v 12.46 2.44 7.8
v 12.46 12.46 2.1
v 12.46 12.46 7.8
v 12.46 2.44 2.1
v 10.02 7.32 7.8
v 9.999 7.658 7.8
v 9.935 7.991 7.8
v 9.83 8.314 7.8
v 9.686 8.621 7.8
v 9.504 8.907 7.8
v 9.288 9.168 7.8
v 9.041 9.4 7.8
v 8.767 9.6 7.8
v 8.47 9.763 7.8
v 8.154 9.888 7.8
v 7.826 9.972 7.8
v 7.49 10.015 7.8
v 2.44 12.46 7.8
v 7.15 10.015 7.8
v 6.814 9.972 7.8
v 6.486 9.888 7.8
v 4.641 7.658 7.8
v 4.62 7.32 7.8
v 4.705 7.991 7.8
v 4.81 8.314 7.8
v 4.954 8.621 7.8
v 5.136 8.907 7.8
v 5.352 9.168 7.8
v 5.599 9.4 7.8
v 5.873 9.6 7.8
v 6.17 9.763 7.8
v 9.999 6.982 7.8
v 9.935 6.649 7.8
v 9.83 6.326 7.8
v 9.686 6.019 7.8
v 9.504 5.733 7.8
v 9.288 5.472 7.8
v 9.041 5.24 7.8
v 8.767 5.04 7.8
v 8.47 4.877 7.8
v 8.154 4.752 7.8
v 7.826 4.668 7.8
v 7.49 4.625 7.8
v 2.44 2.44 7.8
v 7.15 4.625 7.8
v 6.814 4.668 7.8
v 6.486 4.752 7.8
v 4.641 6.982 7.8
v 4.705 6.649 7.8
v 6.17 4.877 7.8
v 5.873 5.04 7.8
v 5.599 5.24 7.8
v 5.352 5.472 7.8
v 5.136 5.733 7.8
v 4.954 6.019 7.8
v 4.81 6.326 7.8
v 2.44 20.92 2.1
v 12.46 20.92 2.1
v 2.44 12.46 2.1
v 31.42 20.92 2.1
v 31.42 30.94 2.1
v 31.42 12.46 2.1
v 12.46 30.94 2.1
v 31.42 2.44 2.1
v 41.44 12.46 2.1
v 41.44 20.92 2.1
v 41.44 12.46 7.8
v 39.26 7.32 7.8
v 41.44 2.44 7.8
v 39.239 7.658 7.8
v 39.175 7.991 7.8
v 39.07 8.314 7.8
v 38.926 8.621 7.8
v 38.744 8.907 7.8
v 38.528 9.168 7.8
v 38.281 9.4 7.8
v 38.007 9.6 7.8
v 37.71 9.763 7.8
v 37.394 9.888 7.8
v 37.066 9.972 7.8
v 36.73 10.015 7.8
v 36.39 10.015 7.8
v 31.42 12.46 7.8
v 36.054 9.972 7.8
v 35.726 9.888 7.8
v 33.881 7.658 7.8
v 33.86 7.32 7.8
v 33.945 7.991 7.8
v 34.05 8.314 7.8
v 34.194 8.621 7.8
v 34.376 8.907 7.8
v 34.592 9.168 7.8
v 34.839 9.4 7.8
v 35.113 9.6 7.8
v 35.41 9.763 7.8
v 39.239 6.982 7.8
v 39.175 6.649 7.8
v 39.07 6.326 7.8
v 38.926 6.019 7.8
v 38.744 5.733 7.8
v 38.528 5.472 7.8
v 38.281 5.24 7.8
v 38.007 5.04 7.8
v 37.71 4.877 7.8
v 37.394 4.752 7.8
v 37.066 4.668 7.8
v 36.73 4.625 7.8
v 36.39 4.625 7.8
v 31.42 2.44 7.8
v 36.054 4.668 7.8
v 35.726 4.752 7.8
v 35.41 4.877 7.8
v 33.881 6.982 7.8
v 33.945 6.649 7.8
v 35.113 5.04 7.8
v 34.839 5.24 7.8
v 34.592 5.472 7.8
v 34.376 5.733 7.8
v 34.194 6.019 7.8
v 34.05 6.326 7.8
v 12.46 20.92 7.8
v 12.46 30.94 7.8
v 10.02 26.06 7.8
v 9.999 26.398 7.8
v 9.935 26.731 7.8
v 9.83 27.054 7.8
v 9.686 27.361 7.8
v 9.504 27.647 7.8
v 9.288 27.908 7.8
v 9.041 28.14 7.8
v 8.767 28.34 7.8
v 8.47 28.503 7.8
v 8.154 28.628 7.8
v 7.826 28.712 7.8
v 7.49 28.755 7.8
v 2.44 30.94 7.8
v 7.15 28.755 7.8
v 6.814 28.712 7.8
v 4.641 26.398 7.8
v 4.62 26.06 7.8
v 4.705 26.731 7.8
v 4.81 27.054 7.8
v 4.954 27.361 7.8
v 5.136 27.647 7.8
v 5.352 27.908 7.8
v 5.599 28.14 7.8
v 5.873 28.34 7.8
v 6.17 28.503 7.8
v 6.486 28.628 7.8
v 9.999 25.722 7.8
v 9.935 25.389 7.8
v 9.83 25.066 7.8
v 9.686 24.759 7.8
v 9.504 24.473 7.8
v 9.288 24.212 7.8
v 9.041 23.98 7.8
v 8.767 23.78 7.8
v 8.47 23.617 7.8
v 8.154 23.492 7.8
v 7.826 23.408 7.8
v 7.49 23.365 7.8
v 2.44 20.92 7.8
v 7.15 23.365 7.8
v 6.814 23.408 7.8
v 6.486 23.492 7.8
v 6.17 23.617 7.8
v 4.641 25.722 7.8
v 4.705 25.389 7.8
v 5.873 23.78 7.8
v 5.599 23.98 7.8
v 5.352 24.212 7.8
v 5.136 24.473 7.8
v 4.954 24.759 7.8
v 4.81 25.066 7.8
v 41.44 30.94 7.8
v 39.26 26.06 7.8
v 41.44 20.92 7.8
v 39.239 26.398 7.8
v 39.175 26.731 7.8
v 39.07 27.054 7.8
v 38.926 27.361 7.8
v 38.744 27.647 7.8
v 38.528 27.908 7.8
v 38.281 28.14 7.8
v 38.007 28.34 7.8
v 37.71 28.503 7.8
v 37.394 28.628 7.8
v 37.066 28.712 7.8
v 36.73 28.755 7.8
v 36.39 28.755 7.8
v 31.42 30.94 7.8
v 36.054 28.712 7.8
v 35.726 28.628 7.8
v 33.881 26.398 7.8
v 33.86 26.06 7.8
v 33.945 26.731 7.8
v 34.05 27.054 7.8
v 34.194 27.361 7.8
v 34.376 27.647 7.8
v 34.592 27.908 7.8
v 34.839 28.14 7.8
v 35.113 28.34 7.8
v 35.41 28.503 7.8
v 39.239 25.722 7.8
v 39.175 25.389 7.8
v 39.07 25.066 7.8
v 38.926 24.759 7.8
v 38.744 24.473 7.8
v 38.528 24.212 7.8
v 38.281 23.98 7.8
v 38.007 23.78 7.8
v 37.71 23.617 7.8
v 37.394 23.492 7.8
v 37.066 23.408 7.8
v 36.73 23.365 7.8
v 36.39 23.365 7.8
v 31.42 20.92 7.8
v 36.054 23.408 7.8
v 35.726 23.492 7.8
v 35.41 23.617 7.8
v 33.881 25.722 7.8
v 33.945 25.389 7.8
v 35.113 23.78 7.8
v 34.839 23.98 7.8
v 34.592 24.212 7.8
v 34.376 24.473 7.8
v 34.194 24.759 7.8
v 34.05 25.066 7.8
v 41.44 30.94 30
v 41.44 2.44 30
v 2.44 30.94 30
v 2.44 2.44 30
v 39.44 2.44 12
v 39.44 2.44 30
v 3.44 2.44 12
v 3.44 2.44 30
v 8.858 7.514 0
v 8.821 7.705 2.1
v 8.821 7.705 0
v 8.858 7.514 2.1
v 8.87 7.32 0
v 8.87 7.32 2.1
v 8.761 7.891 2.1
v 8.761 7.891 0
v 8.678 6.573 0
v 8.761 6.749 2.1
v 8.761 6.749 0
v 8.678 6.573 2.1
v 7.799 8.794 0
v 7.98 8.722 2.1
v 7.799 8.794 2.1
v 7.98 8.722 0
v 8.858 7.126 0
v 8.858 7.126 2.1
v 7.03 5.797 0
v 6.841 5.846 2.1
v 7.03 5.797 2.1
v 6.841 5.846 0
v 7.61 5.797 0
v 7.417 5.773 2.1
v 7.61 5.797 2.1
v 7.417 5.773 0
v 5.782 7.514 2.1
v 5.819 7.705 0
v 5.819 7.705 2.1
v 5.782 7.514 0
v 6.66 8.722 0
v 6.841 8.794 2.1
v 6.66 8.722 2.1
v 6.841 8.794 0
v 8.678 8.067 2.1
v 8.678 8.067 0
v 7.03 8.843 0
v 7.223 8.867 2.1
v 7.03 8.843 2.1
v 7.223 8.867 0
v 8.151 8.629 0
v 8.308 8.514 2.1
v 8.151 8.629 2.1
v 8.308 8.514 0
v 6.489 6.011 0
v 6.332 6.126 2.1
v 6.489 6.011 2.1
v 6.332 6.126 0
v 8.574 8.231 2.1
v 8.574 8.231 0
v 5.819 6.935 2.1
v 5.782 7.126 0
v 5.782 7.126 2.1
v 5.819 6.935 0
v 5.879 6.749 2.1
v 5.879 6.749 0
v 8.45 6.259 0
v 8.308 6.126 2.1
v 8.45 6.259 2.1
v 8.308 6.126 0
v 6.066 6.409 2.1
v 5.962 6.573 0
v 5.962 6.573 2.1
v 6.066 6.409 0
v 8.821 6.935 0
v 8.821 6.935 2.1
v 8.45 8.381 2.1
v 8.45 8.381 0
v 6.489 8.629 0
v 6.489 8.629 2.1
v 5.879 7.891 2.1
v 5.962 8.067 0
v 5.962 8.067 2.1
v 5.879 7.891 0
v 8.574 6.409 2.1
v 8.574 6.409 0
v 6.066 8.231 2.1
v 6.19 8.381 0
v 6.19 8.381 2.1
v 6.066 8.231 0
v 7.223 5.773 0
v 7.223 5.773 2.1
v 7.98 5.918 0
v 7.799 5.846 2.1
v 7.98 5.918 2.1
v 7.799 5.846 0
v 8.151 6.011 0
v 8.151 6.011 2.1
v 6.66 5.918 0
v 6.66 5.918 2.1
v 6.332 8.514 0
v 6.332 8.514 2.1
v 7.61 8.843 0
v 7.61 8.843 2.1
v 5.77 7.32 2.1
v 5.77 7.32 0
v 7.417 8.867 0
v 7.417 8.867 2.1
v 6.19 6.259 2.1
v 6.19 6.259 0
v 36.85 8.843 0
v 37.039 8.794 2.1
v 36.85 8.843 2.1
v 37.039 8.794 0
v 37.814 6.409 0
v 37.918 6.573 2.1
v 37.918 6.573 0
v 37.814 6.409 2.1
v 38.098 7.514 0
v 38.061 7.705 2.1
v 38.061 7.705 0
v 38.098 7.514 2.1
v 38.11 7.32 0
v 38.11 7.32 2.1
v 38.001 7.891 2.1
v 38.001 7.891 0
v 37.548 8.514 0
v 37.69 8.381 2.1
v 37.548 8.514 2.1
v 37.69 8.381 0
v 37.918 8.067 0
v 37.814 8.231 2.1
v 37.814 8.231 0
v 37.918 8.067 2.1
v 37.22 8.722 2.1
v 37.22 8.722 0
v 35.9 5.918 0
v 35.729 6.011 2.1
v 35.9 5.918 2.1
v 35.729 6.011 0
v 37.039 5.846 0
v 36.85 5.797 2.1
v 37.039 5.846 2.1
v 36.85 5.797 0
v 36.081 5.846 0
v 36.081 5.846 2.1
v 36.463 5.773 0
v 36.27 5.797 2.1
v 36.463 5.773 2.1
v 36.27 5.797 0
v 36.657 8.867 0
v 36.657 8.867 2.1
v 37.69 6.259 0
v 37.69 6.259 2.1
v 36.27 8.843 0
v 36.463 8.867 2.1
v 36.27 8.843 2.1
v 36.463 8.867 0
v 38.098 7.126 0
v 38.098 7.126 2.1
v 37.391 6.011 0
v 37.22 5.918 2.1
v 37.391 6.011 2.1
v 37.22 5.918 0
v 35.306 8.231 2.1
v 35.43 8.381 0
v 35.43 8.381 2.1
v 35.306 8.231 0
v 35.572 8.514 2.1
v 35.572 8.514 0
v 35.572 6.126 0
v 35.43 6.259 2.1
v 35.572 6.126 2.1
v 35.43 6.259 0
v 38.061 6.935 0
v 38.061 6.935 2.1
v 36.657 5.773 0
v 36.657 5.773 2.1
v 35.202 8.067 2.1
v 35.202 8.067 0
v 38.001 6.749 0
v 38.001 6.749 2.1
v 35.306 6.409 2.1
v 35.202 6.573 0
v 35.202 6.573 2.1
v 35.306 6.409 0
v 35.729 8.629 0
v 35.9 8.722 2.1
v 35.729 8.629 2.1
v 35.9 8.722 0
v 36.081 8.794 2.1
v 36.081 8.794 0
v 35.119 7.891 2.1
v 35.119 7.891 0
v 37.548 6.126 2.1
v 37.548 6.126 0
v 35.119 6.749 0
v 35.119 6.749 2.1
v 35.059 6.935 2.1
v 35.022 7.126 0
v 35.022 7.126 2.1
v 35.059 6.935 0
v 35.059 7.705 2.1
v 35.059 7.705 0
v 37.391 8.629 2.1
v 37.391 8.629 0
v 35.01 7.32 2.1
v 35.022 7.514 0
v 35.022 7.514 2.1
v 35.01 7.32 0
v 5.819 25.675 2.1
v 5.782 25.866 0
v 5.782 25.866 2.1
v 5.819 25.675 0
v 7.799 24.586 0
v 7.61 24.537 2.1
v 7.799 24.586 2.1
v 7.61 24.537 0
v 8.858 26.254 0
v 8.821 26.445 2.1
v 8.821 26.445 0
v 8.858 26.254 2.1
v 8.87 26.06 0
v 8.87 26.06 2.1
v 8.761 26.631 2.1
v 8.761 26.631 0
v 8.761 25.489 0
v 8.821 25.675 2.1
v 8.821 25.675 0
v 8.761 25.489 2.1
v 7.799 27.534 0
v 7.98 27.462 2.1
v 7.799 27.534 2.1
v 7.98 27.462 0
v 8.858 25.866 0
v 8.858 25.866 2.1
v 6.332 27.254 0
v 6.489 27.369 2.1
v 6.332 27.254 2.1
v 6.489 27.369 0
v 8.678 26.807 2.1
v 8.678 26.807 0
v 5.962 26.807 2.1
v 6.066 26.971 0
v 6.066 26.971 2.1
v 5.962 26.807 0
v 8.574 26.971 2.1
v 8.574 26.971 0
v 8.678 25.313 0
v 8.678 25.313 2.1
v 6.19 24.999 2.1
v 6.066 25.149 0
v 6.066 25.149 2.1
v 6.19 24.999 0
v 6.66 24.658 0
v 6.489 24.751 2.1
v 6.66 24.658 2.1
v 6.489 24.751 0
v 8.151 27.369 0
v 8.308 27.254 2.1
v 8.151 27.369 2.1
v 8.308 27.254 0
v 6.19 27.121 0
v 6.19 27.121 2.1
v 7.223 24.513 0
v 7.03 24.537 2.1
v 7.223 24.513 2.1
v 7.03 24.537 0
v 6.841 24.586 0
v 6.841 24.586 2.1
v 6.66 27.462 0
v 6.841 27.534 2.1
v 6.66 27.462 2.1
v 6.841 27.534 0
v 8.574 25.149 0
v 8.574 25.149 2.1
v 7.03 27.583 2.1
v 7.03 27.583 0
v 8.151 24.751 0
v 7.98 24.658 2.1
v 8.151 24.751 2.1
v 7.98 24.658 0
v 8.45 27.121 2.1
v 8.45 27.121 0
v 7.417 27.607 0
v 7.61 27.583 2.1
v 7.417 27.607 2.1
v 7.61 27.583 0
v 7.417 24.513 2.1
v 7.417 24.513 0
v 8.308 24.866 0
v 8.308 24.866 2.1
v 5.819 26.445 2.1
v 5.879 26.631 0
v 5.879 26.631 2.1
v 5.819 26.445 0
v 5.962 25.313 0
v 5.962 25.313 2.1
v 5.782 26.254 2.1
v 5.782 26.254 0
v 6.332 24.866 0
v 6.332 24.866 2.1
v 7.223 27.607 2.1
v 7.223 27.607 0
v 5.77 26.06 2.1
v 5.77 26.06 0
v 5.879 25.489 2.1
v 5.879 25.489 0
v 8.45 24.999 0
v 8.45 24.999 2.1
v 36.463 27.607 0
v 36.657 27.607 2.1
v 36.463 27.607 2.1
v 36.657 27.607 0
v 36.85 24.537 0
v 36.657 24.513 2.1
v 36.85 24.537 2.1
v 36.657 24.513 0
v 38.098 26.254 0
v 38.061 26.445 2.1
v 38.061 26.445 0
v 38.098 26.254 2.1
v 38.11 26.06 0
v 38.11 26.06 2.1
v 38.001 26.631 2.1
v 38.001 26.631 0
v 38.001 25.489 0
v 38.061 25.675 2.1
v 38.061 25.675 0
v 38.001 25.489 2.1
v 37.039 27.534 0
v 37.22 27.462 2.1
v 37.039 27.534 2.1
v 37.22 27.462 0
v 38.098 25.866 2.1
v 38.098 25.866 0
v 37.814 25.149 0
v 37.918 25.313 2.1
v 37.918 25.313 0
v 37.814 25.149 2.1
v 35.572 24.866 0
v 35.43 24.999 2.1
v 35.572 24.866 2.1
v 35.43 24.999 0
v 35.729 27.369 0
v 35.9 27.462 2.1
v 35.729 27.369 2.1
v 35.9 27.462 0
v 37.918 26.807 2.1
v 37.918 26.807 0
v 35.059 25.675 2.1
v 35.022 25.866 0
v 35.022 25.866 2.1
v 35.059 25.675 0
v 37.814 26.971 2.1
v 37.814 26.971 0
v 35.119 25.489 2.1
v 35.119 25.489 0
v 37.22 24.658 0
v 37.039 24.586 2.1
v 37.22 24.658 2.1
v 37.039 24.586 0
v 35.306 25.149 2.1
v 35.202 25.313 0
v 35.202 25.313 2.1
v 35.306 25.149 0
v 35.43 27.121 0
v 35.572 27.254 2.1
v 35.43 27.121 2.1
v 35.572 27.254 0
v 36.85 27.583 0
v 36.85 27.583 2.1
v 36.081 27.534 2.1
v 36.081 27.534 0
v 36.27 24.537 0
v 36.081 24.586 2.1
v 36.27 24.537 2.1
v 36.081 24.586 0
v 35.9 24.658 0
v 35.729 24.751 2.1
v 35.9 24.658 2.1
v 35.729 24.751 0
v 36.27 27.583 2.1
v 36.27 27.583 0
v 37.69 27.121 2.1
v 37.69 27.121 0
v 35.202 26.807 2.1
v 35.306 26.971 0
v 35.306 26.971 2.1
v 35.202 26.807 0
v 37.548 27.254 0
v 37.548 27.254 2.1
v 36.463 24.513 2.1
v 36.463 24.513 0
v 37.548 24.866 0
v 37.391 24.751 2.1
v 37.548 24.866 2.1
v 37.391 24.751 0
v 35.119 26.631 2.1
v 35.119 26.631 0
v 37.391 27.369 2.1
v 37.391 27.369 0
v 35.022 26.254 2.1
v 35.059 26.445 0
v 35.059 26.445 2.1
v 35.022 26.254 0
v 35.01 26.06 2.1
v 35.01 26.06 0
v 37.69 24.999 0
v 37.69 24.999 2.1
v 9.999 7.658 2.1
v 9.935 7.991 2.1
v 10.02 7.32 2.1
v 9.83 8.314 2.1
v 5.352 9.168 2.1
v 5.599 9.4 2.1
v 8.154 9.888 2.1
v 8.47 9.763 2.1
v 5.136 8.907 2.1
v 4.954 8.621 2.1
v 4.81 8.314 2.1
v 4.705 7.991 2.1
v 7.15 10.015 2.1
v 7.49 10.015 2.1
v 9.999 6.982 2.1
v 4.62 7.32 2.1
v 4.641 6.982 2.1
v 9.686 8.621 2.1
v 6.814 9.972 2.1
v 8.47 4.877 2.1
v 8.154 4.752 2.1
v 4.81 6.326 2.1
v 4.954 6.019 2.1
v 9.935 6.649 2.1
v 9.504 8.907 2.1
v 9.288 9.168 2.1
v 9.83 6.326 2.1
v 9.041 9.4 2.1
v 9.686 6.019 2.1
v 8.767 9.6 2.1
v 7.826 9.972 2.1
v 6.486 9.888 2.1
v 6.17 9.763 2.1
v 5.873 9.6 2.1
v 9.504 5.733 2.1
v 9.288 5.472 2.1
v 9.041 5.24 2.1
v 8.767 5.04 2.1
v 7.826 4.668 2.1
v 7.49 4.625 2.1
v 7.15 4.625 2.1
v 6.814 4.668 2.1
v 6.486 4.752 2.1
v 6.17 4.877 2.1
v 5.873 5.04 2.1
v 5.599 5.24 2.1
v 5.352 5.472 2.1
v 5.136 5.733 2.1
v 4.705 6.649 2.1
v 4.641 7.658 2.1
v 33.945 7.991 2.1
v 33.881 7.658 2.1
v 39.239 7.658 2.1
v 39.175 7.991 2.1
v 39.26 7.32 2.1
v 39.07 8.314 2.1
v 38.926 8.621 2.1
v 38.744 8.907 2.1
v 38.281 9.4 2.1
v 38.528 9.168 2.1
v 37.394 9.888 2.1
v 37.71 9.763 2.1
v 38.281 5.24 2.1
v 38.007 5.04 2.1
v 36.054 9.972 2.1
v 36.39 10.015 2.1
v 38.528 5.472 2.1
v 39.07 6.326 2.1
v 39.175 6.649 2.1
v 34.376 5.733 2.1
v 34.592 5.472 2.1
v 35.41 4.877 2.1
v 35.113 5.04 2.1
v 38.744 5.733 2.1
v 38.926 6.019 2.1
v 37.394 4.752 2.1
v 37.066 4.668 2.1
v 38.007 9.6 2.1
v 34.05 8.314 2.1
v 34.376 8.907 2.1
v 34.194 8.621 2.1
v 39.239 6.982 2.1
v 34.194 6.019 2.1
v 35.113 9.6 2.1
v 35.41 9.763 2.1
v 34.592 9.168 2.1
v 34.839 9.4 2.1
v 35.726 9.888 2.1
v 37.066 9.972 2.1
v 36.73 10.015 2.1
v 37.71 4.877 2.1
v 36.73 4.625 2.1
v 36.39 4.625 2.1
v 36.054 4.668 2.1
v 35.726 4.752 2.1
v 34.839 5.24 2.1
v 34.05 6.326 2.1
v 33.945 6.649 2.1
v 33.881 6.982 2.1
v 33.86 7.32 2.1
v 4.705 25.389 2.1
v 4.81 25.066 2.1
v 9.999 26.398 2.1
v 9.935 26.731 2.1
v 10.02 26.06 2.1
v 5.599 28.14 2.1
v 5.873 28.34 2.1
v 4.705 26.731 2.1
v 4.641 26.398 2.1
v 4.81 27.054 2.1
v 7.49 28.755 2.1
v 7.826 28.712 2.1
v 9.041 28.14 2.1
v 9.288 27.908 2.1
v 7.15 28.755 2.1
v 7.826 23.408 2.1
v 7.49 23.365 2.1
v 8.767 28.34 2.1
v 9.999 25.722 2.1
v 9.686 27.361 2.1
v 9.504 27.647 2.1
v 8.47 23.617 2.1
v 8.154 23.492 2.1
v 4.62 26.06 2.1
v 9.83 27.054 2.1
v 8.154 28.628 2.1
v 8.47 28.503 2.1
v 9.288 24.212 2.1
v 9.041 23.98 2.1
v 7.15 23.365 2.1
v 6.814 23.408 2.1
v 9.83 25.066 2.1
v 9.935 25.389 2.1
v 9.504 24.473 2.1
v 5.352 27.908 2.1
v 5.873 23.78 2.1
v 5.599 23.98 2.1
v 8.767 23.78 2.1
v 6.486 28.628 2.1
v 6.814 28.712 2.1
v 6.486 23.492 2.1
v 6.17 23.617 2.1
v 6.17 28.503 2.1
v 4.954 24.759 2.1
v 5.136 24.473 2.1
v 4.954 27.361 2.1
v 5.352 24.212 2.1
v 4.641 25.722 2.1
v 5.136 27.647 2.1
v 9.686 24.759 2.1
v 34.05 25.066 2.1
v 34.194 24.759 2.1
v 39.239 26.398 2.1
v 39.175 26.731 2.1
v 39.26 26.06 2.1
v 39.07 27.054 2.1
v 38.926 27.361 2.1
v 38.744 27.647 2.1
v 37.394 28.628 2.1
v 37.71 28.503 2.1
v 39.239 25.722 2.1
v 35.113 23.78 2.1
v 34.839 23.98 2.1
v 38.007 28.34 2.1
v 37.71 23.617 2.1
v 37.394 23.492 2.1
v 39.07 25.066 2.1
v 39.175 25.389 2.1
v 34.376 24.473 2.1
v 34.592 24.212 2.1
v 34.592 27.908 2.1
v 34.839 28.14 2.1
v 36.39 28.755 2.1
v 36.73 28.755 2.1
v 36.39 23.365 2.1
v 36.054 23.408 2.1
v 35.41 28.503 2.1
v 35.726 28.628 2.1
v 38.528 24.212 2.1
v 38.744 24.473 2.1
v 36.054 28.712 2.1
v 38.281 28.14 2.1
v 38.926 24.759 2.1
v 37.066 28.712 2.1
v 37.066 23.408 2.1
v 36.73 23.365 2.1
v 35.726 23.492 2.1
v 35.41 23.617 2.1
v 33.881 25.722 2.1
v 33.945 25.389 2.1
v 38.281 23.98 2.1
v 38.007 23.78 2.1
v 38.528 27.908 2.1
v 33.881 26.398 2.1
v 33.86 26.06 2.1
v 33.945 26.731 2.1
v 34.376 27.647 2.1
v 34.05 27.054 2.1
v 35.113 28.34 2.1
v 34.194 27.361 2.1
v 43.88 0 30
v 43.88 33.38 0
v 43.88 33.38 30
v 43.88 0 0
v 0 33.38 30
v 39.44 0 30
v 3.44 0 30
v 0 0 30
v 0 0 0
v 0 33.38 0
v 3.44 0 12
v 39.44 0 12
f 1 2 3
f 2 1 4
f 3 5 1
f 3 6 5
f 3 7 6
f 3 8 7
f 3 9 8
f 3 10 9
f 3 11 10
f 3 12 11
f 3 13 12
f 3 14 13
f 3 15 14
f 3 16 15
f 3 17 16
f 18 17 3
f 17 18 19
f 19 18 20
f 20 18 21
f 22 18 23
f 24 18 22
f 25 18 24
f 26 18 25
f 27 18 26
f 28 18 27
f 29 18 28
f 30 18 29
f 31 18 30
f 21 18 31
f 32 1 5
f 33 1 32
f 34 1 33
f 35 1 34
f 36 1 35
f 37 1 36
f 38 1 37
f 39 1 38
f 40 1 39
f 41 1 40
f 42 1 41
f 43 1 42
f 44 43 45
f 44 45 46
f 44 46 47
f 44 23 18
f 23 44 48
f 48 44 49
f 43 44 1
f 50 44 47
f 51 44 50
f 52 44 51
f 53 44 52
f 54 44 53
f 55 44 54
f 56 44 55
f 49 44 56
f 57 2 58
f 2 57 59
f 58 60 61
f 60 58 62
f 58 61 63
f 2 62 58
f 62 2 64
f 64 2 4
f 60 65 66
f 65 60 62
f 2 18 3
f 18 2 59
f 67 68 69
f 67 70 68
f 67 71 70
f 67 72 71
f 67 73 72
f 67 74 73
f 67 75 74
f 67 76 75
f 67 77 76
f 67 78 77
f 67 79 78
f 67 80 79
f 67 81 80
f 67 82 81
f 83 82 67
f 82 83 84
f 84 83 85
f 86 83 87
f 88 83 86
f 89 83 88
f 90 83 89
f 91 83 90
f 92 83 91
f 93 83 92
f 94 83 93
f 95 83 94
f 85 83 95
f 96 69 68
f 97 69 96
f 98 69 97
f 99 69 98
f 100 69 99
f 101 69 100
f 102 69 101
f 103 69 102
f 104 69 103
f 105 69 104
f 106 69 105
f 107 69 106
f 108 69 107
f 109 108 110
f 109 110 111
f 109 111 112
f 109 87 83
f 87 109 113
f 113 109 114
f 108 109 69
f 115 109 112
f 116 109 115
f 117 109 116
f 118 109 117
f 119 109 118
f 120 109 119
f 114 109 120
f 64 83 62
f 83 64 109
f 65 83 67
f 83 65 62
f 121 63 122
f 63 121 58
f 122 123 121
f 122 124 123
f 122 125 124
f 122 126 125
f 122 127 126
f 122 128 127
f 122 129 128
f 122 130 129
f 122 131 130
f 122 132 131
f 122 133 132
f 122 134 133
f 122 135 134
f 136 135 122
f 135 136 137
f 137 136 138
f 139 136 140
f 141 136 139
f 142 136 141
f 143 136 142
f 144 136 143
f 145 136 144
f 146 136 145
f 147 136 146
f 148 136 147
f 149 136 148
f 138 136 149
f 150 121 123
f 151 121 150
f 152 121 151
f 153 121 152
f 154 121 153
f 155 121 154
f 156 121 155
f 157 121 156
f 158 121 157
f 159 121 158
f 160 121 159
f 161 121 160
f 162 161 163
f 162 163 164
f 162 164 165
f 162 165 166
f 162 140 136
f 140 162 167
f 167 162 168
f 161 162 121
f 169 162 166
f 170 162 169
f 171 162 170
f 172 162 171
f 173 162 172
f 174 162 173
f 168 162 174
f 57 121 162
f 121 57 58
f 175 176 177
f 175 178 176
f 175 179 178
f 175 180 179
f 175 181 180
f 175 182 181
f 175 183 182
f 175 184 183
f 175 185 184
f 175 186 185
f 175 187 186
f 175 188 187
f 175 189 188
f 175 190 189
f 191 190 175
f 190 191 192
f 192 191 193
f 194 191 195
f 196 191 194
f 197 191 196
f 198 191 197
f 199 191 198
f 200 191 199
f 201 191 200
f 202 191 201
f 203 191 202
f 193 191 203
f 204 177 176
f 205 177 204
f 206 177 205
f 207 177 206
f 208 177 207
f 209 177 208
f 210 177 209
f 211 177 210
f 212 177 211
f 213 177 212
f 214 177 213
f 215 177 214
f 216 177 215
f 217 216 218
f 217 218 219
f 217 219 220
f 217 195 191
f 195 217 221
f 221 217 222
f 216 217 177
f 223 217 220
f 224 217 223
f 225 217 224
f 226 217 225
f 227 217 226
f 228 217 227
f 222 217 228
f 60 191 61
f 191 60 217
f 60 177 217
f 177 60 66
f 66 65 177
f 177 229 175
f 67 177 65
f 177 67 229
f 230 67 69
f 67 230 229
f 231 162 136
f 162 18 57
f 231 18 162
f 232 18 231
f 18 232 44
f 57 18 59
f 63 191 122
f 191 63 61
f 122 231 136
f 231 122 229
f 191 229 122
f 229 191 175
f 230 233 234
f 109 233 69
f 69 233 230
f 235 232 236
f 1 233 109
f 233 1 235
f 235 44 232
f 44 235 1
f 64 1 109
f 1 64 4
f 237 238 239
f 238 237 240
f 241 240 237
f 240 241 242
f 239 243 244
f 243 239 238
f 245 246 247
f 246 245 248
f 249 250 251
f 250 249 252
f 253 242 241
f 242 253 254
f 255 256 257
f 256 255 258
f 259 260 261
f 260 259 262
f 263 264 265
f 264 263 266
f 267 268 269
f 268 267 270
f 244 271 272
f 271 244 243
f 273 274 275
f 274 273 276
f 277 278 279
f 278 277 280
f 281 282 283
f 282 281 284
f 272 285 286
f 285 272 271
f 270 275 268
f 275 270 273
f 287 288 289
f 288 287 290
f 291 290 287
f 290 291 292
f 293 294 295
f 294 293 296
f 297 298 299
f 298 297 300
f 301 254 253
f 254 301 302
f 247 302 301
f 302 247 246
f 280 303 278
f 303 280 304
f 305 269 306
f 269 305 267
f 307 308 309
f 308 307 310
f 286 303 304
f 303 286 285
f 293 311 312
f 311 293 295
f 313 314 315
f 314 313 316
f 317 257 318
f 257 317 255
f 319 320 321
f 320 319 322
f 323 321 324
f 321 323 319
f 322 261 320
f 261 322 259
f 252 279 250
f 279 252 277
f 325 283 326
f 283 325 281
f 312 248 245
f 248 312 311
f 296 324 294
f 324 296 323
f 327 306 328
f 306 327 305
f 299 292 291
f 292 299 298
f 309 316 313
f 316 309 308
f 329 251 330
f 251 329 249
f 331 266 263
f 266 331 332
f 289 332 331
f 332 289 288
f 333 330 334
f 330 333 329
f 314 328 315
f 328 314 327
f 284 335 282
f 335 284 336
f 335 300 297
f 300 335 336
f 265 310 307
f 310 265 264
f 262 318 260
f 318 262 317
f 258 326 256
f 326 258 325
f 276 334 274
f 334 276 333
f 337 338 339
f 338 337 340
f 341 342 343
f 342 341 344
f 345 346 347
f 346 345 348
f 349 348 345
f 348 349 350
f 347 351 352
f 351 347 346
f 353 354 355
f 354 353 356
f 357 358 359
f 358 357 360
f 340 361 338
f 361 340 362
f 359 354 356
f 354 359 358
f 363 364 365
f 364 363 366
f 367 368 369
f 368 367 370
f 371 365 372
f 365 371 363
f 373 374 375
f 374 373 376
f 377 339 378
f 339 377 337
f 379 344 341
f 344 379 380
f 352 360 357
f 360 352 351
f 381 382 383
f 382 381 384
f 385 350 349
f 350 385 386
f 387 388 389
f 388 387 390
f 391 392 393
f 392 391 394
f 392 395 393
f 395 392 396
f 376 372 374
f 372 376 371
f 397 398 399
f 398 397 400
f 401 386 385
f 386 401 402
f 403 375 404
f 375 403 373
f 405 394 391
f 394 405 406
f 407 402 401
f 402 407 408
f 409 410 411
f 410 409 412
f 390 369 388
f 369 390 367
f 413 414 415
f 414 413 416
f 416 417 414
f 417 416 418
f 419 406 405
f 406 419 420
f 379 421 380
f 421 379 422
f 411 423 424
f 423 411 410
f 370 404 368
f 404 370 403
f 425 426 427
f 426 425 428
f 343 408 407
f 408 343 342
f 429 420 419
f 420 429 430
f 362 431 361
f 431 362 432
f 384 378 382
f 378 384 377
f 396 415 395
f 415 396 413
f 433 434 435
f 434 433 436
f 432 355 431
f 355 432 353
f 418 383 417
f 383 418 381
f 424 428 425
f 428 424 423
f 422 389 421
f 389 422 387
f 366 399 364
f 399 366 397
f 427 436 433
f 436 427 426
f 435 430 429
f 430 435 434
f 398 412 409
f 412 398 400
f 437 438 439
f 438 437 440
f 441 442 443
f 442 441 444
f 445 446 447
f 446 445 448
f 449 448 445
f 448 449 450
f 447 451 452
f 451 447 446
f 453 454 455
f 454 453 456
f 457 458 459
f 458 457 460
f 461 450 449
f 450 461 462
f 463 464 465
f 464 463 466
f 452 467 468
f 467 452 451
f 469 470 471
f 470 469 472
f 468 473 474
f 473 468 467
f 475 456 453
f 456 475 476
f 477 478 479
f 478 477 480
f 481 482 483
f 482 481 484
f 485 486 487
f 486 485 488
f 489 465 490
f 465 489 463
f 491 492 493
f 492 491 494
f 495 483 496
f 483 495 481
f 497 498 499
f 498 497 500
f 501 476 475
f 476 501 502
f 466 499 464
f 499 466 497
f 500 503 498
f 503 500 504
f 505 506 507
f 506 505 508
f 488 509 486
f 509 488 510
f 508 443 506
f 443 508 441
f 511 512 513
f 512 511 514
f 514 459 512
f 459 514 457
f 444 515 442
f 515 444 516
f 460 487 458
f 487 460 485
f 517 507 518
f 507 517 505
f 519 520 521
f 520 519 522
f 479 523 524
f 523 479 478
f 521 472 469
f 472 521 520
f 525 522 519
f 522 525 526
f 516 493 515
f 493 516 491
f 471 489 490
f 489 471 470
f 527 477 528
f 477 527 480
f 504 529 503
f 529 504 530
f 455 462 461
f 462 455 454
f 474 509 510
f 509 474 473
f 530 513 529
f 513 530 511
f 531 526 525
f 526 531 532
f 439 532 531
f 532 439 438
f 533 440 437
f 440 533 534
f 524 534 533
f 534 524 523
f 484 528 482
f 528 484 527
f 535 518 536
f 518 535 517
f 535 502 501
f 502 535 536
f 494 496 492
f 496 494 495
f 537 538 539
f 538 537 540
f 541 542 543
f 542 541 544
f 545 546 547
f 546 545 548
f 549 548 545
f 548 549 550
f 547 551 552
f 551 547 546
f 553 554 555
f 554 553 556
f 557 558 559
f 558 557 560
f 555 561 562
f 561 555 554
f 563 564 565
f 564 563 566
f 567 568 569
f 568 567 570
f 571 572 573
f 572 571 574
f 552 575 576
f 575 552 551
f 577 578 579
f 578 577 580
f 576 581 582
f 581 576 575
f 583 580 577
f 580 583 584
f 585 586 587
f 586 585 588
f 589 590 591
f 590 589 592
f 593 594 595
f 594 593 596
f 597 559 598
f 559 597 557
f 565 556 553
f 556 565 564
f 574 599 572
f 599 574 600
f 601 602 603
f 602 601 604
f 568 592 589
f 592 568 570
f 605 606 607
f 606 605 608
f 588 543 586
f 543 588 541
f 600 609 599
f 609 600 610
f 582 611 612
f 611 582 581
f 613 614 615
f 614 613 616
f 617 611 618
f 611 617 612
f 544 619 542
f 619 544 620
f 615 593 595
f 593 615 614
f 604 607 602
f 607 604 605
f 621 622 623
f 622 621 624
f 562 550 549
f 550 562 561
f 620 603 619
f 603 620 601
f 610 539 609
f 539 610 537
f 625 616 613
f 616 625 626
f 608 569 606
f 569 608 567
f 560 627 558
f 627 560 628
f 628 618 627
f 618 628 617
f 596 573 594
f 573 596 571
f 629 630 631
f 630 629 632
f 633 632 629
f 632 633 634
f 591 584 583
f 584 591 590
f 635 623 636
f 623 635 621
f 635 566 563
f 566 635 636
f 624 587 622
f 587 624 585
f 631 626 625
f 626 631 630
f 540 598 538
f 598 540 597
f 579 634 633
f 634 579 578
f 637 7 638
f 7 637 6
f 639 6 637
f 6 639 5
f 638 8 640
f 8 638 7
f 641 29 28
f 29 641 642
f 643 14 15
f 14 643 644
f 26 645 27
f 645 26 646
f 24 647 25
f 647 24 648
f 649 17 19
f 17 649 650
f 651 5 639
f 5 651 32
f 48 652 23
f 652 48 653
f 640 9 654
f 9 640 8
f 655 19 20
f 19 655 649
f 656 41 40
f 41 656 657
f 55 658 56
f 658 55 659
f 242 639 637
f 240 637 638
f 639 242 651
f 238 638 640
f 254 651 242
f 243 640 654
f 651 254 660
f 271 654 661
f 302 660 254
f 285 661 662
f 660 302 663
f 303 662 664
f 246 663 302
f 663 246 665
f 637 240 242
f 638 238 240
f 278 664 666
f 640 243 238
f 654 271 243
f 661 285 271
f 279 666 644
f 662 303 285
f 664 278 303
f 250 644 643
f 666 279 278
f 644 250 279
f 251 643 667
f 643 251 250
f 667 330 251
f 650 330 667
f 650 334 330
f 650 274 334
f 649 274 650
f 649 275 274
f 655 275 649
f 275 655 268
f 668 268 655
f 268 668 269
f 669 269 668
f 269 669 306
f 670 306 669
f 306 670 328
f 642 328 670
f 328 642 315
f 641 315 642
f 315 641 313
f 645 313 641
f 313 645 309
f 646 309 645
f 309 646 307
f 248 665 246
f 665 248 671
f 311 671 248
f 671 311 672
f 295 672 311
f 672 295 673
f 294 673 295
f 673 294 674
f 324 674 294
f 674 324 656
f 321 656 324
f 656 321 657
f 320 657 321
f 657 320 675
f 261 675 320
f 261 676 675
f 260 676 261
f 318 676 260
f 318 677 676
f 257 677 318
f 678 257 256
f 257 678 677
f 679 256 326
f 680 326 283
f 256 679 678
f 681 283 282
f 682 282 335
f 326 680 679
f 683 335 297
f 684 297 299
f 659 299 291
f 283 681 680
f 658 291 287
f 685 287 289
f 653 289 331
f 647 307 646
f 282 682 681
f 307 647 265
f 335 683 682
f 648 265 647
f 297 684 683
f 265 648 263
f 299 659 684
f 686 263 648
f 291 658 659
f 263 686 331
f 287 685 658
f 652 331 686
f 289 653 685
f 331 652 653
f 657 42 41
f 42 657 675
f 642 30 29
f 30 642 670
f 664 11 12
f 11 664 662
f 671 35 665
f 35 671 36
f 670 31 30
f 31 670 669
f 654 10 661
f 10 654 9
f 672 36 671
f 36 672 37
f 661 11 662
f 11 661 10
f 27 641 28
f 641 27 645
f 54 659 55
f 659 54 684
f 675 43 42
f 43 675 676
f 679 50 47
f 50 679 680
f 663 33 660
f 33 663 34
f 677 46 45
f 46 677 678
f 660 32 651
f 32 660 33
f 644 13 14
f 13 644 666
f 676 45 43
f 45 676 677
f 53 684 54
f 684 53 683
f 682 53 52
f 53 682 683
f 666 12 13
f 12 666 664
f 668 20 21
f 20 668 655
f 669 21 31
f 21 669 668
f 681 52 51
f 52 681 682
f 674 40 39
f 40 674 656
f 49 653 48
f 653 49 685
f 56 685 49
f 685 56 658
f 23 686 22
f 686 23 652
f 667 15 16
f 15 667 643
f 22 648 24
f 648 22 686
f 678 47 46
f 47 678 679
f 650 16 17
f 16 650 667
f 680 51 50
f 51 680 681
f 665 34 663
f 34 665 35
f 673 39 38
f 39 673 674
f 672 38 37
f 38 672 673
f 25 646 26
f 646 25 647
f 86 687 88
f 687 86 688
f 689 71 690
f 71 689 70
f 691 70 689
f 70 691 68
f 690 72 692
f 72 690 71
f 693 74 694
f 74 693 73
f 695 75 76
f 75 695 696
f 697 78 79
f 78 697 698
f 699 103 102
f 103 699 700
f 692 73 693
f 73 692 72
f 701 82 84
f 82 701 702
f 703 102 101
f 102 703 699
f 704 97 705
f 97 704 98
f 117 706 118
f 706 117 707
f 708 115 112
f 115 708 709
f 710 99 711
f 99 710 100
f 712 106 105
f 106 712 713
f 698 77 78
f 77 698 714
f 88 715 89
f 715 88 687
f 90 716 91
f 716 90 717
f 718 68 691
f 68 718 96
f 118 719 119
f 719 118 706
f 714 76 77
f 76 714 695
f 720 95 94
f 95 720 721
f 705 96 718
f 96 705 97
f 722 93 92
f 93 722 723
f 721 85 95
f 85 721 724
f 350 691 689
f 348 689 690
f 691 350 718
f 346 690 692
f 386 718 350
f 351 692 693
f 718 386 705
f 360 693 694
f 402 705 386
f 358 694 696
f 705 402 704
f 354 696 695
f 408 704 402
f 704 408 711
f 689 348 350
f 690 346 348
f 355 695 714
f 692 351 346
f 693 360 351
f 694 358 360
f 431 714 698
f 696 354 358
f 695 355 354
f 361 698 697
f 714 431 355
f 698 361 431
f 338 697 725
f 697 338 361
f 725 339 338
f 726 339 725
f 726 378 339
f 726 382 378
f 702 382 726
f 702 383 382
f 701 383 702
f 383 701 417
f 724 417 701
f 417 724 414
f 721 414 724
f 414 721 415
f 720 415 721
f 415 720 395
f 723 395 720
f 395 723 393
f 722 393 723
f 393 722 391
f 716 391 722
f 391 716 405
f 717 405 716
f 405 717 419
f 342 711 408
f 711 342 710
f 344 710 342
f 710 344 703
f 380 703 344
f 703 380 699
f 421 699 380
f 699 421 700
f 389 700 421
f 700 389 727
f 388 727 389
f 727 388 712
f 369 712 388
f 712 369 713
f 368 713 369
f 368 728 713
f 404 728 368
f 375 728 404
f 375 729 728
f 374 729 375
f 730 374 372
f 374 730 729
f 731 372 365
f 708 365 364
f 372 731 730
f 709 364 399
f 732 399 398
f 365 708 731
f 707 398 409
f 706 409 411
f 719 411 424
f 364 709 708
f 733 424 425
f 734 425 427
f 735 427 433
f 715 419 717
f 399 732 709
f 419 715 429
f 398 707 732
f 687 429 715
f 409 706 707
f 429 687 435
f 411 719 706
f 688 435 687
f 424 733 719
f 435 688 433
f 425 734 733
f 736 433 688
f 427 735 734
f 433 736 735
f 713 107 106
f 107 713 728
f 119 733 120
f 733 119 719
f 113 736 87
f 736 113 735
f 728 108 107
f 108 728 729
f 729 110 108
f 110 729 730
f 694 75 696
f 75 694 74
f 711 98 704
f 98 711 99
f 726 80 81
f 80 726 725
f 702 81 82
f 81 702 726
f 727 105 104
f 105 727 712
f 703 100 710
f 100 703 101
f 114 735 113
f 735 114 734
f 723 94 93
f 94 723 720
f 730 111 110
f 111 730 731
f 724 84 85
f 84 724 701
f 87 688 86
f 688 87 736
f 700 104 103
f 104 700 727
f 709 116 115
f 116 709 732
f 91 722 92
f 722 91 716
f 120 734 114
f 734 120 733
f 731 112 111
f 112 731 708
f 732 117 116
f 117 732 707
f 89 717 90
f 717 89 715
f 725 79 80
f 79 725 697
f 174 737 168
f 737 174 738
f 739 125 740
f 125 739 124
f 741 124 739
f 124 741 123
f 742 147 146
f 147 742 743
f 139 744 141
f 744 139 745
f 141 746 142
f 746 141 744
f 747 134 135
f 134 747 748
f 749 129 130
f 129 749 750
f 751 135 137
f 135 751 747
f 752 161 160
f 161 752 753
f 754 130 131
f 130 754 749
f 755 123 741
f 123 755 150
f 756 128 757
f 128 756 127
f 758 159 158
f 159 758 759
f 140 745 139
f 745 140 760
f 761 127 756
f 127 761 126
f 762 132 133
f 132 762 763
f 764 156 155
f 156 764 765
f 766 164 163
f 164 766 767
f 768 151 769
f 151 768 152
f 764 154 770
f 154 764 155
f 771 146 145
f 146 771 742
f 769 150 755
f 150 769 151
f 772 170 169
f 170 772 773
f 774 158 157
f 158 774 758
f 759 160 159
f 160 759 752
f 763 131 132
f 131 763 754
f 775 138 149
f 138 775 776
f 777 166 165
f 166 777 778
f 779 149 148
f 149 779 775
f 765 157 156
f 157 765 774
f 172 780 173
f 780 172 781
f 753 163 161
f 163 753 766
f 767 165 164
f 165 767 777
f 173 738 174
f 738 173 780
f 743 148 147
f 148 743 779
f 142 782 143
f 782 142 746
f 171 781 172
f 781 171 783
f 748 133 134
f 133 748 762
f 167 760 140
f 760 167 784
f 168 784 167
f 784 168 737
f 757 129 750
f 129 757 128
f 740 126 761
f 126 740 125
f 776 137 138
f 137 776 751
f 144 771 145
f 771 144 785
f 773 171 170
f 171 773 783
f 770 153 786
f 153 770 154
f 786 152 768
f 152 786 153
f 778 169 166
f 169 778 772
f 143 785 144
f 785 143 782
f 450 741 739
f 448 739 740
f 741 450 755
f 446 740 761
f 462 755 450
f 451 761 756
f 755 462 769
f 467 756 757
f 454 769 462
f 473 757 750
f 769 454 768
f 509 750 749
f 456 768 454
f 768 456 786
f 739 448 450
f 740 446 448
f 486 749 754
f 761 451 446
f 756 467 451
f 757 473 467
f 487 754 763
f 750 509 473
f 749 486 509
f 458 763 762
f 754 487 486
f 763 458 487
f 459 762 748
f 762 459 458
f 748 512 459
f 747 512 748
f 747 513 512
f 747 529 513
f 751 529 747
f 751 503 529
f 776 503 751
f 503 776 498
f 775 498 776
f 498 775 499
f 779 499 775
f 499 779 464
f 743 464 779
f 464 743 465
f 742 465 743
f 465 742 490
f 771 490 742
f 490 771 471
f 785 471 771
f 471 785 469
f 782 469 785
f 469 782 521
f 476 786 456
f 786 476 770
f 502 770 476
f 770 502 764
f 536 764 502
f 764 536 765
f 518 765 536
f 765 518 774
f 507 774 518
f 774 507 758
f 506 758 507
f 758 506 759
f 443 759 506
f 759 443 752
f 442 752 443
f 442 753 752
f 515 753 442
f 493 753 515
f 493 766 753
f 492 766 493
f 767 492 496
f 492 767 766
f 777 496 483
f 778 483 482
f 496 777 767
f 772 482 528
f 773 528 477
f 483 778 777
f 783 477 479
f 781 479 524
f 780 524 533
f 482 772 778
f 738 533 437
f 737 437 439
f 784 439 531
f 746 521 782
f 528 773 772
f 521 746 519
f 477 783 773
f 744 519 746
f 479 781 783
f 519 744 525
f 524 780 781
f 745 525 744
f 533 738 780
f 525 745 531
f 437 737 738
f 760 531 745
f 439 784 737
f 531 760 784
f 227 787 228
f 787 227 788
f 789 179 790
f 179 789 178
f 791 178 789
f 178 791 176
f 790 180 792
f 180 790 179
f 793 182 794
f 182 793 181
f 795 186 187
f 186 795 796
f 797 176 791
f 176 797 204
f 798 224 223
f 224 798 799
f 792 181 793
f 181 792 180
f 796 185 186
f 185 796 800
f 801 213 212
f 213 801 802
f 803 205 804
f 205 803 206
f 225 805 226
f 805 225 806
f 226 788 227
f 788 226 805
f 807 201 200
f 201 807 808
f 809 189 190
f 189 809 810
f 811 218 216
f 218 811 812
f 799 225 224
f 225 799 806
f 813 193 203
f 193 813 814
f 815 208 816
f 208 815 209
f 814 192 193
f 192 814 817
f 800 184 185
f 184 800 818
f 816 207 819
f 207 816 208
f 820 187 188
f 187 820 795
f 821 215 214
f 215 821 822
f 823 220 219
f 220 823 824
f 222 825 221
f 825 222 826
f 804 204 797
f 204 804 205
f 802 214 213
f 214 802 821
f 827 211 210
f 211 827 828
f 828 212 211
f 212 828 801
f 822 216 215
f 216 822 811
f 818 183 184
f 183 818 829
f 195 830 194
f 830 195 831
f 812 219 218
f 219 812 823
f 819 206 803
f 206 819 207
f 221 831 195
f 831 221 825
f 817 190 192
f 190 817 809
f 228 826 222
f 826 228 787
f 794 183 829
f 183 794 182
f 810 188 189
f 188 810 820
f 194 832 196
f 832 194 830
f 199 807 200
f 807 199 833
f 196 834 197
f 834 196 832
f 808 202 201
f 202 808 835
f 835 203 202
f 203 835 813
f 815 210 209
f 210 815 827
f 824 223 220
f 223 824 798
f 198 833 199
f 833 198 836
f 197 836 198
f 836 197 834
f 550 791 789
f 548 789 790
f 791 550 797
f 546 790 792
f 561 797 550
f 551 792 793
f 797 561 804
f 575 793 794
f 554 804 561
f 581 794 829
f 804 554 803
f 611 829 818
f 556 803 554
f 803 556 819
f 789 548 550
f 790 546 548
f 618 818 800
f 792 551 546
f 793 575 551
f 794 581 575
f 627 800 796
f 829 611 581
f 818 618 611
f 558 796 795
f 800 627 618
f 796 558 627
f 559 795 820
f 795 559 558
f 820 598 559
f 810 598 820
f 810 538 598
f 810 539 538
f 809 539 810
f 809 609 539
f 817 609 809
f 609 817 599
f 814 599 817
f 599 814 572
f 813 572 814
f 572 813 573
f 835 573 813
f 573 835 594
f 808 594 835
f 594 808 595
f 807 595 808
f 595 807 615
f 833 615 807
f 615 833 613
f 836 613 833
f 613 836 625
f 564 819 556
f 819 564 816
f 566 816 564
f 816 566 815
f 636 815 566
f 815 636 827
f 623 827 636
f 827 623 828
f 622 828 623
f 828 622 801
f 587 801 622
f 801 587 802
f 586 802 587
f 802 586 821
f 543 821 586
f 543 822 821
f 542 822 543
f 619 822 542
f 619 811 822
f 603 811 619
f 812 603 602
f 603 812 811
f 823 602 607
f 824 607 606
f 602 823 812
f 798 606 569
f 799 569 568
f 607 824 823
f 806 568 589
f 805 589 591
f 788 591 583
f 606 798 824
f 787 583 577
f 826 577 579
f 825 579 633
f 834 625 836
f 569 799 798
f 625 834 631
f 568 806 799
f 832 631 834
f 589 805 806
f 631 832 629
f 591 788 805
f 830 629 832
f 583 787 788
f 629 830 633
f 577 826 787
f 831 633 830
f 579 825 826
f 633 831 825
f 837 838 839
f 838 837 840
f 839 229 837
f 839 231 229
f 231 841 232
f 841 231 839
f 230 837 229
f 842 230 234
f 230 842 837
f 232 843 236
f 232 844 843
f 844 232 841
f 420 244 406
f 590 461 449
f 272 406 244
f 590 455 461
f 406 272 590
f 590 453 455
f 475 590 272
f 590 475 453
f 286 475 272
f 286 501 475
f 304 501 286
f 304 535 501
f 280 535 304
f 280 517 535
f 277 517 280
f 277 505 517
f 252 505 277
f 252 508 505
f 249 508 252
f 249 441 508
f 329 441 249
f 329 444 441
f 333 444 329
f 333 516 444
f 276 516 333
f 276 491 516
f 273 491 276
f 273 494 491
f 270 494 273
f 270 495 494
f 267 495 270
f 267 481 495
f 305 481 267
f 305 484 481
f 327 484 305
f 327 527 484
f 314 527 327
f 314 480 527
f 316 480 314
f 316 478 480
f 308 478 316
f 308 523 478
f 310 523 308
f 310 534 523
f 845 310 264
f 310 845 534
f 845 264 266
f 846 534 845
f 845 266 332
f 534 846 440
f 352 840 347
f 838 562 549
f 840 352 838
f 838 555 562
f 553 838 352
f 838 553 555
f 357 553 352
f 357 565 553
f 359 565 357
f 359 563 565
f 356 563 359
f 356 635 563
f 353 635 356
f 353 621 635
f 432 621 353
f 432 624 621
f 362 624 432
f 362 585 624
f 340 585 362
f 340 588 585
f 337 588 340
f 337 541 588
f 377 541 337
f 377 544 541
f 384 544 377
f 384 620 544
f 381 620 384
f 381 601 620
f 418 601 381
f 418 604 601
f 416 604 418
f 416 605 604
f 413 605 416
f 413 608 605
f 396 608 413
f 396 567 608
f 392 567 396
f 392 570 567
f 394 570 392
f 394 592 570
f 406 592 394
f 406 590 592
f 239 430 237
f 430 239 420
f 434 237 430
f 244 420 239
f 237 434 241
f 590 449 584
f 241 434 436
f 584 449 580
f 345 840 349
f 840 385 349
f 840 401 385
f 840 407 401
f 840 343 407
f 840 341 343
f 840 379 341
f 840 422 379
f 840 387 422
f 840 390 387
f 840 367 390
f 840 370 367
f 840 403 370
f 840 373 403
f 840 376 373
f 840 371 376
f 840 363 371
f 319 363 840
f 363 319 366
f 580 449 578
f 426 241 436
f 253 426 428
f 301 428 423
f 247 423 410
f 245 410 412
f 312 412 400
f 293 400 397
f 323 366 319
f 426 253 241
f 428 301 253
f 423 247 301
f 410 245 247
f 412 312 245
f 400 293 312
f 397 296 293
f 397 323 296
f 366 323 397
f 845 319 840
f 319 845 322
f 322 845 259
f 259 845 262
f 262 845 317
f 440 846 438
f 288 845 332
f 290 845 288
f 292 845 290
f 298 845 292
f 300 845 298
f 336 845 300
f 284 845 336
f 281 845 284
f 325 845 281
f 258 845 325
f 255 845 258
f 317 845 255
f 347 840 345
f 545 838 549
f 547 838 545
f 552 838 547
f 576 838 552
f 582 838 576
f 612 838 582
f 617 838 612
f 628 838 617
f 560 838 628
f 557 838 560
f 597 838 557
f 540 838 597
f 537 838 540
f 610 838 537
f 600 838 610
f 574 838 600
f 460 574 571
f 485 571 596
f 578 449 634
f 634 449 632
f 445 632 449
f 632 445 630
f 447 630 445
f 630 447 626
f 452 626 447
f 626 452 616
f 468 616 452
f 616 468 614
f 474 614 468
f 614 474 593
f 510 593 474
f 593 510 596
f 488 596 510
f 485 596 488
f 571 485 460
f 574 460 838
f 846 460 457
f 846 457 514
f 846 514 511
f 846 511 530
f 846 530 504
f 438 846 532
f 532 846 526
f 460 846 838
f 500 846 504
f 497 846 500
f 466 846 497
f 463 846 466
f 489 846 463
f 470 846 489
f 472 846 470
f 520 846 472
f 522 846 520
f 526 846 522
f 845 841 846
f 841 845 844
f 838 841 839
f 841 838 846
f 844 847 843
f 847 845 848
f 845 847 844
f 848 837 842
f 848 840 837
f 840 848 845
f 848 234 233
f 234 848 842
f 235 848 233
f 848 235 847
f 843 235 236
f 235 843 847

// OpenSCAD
// file: ../modules/enclosure_box.scad
// ----------------------------------------------------------------------------------
include<printer_limits.scad>
// ----------------------------------------------------------------------------------
function enclosure_close_box_lid_rotate_ang(draw_as_close_box=false) =
  (draw_as_close_box) ?
    ([0, 180, 0])
  : ([0, 0, 0]);

function enclosure_close_box_lid_translate_xyz(draw_as_close_box=false, length=50, width=40, height=15, xy_wall_width=ptr_wall_width, z_wall_width=z_dim_adj(1), tolerance=ptr_tolerance) =
  (draw_as_close_box) ?
    ([-length-2*xy_wall_width, 0, -2*z_wall_width-height-tolerance])
  : ([0, -width-4*xy_wall_width, 0]);

// ----------------------------------------------------------------------------------
module enclosure_box(
  length=50,
  width=40,
  height=15,
  lid_height=5,
  xy_wall_width=ptr_wall_width,
  z_wall_width=z_dim_adj(1),
  fitted_lid=true,
  draw_lid=false,
  draw_container=false,
  xy_screws=false,
  xy_screws_hide=false,
  bottom_connectors=false,
  tolerance=0.0
)
{
  echo("+Enclosure box");
  
  // Bottom
  if(draw_container) {
    difference() {
      cube([length+2*xy_wall_width, width+2*xy_wall_width, height+z_wall_width]);
      union() {
        difference() {
          translate([xy_wall_width, xy_wall_width, z_wall_width])
            cube([length, width, height+z_wall_width]);
            if(xy_screws_hide && xy_screws_hide[1]>0)
              for(xy = xy_screws[1]) {
                translate([xy[0], xy[1], xy_screws_hide[1]/2+z_wall_width])
                  cube([xy_screws_hide[0]+2*xy_wall_width, xy_screws_hide[0]+2*xy_wall_width, xy_screws_hide[1]], center=true);
              }
        }
        if(xy_screws) {
          for(xy = xy_screws[1]) {
            translate([xy[0], xy[1], 0])
              cylinder(h=3*z_wall_width, d=xy_screws[0], $fn=50, center=true);
          }
        }
        if(xy_screws_hide) {
          h = abs(xy_screws_hide[1])+2*z_wall_width;
          offset = (xy_screws_hide[1] < 0) ? (h/2 + z_wall_width + xy_screws_hide[1]) : (xy_screws_hide[1]/2+2*z_wall_width);
          for(xy = xy_screws[1]) {
            translate([xy[0], xy[1], offset])
              cylinder(h=h, d=xy_screws_hide[0], $fn=50, center=true);
          }
        }
        if(bottom_connectors) {
          for(xy = xy_screws[1]) {
            translate([xy[0], xy[1], 0])
              cylinder(h=3*z_wall_width, d=xy_screws[0], $fn=50, center=true);
          }
        }
      }
    }
  }
  
  // Lid
  if(draw_lid) {
    difference() {
      if(fitted_lid) {
        cube([length+2*xy_wall_width, width+2*xy_wall_width, lid_height+z_wall_width]);
      }
      else {
        translate([-xy_wall_width, -xy_wall_width, 0])
          cube([length+4*xy_wall_width, width+4*xy_wall_width, lid_height+z_wall_width]);
      }
      
      if(fitted_lid) {
        difference() {
          translate([-xy_wall_width, -xy_wall_width, z_wall_width])
            cube([length+4*xy_wall_width, width+4*xy_wall_width, lid_height+2*z_wall_width]);
          translate([xy_wall_width, xy_wall_width, z_wall_width])
            cube([length, width, height+z_wall_width]);
      }
      translate([2*xy_wall_width, 2*xy_wall_width, z_wall_width])
        cube([length-2*xy_wall_width, width-2*xy_wall_width, height+z_wall_width]);
      }
      else {
        translate([0, 0, z_wall_width])
          cube([length+2*xy_wall_width, width+2*xy_wall_width, lid_height+2*z_wall_width]);
      }
    }
  }
}
// ----------------------------------------------------------------------------------
if(false) {
  enclosure_box(draw_container=true);
  rotate(enclosure_close_box_lid_rotate_ang(false))
    translate(enclosure_close_box_lid_translate_xyz(false))
      enclosure_box(draw_lid=true, fitted_lid=true);
}
// ----------------------------------------------------------------------------------
// file: ../modules/printer_limits.scad
// ----------------------------------------------------------------------------------
// TODO: add function to get match wall_width
// ----------------------------------------------------------------------------------
first_layer_height = 0.3;
min_layer_height = 0.3;
layer_height = 0.6;

ptr_top_wall_width = 2*layer_height;
ptr_tolerance = min_layer_height/2;
// ----------------------------------------------------------------------------------
// lines: width (mm)
ptr_2lines = 1.67;
ptr_3lines = 2.44;
ptr_4lines = 3.21;
ptr_5lines = 3.98;
ptr_6lines = 4.76;

ptr_smallest_wall_width = ptr_2lines;
ptr_wall_width = ptr_3lines;
// ----------------------------------------------------------------------------------
min_x = 8;
max_x = 223;
min_y = 2;
max_y = 207;
max_z = 230;
// ----------------------------------------------------------------------------------
// LxW
max_printable_length = max(max_x-min_x, max_y-min_y);
max_printable_width = min(max_x-min_x, max_y-min_y);
// ----------------------------------------------------------------------------------
function xy_dim_adj(x) = ceil(x/ptr_smallest_wall_width)*ptr_smallest_wall_width;
function  z_dim_adj(z) = ceil((z-first_layer_height)/min_layer_height)*min_layer_height + first_layer_height;
function xy_wall_width_adj(x) =
    (x <= ptr_2lines) ? (ptr_2lines) :
    (x <= ptr_3lines) ? (ptr_3lines) :
    (x <= ptr_4lines) ? (ptr_4lines) :
    (x <= ptr_5lines) ? (ptr_5lines) :
    (x <= ptr_6lines) ? (ptr_6lines) :
    (ptr_6lines);
    
// ----------------------------------------------------------------------------------
// screws diameters with tolerances
// https://www.engineersedge.com/hardware/standard_metric_hex_nuts_13728.htm
xy_tolerance = 0.1;
z_tolerance = min_layer_height;

// M3
xy_screw_3mm_d      = 3 + xy_tolerance;
xy_screw_3mm_hd_d   = 5.3 + xy_tolerance;
xy_screw_3mm_hd_h   = z_dim_adj(2.1 + xy_tolerance);
xy_screw_3mm_nut_d  = 5.50+z_tolerance;
xy_screw_3mm_nut_dd = 6.35+z_tolerance;
xy_screw_3mm_nut_h  = z_dim_adj(2.55+z_tolerance);

z_screw_3mm_d      = z_dim_adj(3+z_tolerance);
z_screw_3mm_nut_d  = z_dim_adj(5.50+z_tolerance);
z_screw_3mm_nut_dd = z_dim_adj(6.35+z_tolerance);
z_screw_3mm_nut_h  = z_dim_adj(2.55+z_tolerance);

// M4
xy_screw_4mm_d      = 4 + xy_tolerance;
xy_screw_4mm_nut_d  = 7.00+z_tolerance;
xy_screw_4mm_nut_dd = 8.08+z_tolerance;
xy_screw_4mm_nut_h  = 3.20+z_tolerance;

z_screw_4mm_d      = z_dim_adj(4+z_tolerance);
z_screw_4mm_nut_d  = z_dim_adj(7.00+z_tolerance);
z_screw_4mm_nut_dd = z_dim_adj(8.08+z_tolerance);
z_screw_4mm_nut_h  = z_dim_adj(3.20+z_tolerance);

// M5
xy_screw_5mm_d = 5 + xy_tolerance;
z_screw_5mm_d  = z_dim_adj(5+z_tolerance);
//z_screw_5mm_nut_d  = z_dim_adj(5.50+z_tolerance);
//z_screw_5mm_nut_dd = z_dim_adj(6.35+z_tolerance);
//z_screw_5mm_nut_h  = z_dim_adj(2.55+z_tolerance);
// main file
// ----------------------------------------------------------------------------------
// Print settings:
// - Infill: 15% (or less if bridges OK)
// ----------------------------------------------------------------------------------
include<../modules/printer_limits.scad>
use<../modules/enclosure_box.scad>
// ----------------------------------------------------------------------------------
// DIMENSIONS
zk5ad_wall_width = ptr_wall_width;
zk5ad_bottom_wall_width = z_dim_adj(2);

zk5ad_screws_hide_offset = z_dim_adj(xy_screw_3mm_hd_h + 3);

zk5ad_l = 39;
zk5ad_w = 28.5;
zk5ad_h = z_dim_adj(22 + zk5ad_screws_hide_offset) ;
zk5ad_board_bt_clearence = z_dim_adj(4 + zk5ad_screws_hide_offset);
zk5ad_lid_h = z_dim_adj(6);

// ------------------------------------------
// Screws
zk5ad_screws_xy = [
  [            3*zk5ad_wall_width, 3*zk5ad_wall_width],
  [zk5ad_l - 1*zk5ad_wall_width, 3*zk5ad_wall_width],
  [            3*zk5ad_wall_width, zk5ad_w-1*zk5ad_wall_width],
  [zk5ad_l - 1*zk5ad_wall_width, zk5ad_w-1*zk5ad_wall_width]
];

module zk5ad_enclosure(
  fitted_lid=true,
  draw_lid=false,
  draw_container=false,
  draw_as_close_box=false
)
{
  echo("----------------------------------------------------------------------------------------------------------------------------------------------------");
  echo("ZK-5AD Dual DC-motor H-Bridge Enclosure");
  if(draw_container || draw_as_close_box ) {
    difference() {
      enclosure_box(
        length=zk5ad_l, width=zk5ad_w, height=zk5ad_h, lid_height=zk5ad_lid_h,
        xy_wall_width=zk5ad_wall_width, z_wall_width=zk5ad_bottom_wall_width,
        fitted_lid=fitted_lid, draw_container=true,
        xy_screws=[xy_screw_3mm_d, zk5ad_screws_xy],
        xy_screws_hide=[xy_screw_3mm_hd_d, zk5ad_screws_hide_offset],
        tolerance=ptr_tolerance
      );
      translate([1+zk5ad_wall_width, -zk5ad_wall_width, zk5ad_bottom_wall_width+zk5ad_board_bt_clearence])
        cube([36, 3*zk5ad_wall_width, zk5ad_h+zk5ad_bottom_wall_width]);
    }
  }
  if(draw_lid || draw_as_close_box) {
    rotate(enclosure_close_box_lid_rotate_ang(draw_as_close_box))
      translate(enclosure_close_box_lid_translate_xyz(draw_as_close_box=draw_as_close_box, length=zk5ad_l, width=zk5ad_w, height=zk5ad_h, xy_wall_width=zk5ad_wall_width, z_wall_width=zk5ad_bottom_wall_width))
        difference() {
          enclosure_box(
            length=zk5ad_l, width=zk5ad_w, height=zk5ad_h, lid_height=zk5ad_lid_h,
            xy_wall_width=zk5ad_wall_width, z_wall_width=zk5ad_bottom_wall_width,
            fitted_lid=fitted_lid, draw_lid=true,
            tolerance=ptr_tolerance
          );
          // IO socket
          //translate([2*zk5ad_wall_width, 1*zk5ad_wall_width-0.01, -2*zk5ad_bottom_wall_width])
          translate([zk5ad_l+0*zk5ad_wall_width-16, zk5ad_w-2*zk5ad_wall_width+0.01, -2*zk5ad_bottom_wall_width])
            cube([16, 3*zk5ad_wall_width+0.01, zk5ad_h+zk5ad_bottom_wall_width]);
        }
      }
}

difference() {
  *zk5ad_enclosure(draw_as_close_box=true);
  *zk5ad_enclosure(draw_lid=true, draw_container=true);
  zk5ad_enclosure(draw_container=true);
  *translate([zk5ad_enclosure_l/2, -10, -10])
    cube(500);
}
